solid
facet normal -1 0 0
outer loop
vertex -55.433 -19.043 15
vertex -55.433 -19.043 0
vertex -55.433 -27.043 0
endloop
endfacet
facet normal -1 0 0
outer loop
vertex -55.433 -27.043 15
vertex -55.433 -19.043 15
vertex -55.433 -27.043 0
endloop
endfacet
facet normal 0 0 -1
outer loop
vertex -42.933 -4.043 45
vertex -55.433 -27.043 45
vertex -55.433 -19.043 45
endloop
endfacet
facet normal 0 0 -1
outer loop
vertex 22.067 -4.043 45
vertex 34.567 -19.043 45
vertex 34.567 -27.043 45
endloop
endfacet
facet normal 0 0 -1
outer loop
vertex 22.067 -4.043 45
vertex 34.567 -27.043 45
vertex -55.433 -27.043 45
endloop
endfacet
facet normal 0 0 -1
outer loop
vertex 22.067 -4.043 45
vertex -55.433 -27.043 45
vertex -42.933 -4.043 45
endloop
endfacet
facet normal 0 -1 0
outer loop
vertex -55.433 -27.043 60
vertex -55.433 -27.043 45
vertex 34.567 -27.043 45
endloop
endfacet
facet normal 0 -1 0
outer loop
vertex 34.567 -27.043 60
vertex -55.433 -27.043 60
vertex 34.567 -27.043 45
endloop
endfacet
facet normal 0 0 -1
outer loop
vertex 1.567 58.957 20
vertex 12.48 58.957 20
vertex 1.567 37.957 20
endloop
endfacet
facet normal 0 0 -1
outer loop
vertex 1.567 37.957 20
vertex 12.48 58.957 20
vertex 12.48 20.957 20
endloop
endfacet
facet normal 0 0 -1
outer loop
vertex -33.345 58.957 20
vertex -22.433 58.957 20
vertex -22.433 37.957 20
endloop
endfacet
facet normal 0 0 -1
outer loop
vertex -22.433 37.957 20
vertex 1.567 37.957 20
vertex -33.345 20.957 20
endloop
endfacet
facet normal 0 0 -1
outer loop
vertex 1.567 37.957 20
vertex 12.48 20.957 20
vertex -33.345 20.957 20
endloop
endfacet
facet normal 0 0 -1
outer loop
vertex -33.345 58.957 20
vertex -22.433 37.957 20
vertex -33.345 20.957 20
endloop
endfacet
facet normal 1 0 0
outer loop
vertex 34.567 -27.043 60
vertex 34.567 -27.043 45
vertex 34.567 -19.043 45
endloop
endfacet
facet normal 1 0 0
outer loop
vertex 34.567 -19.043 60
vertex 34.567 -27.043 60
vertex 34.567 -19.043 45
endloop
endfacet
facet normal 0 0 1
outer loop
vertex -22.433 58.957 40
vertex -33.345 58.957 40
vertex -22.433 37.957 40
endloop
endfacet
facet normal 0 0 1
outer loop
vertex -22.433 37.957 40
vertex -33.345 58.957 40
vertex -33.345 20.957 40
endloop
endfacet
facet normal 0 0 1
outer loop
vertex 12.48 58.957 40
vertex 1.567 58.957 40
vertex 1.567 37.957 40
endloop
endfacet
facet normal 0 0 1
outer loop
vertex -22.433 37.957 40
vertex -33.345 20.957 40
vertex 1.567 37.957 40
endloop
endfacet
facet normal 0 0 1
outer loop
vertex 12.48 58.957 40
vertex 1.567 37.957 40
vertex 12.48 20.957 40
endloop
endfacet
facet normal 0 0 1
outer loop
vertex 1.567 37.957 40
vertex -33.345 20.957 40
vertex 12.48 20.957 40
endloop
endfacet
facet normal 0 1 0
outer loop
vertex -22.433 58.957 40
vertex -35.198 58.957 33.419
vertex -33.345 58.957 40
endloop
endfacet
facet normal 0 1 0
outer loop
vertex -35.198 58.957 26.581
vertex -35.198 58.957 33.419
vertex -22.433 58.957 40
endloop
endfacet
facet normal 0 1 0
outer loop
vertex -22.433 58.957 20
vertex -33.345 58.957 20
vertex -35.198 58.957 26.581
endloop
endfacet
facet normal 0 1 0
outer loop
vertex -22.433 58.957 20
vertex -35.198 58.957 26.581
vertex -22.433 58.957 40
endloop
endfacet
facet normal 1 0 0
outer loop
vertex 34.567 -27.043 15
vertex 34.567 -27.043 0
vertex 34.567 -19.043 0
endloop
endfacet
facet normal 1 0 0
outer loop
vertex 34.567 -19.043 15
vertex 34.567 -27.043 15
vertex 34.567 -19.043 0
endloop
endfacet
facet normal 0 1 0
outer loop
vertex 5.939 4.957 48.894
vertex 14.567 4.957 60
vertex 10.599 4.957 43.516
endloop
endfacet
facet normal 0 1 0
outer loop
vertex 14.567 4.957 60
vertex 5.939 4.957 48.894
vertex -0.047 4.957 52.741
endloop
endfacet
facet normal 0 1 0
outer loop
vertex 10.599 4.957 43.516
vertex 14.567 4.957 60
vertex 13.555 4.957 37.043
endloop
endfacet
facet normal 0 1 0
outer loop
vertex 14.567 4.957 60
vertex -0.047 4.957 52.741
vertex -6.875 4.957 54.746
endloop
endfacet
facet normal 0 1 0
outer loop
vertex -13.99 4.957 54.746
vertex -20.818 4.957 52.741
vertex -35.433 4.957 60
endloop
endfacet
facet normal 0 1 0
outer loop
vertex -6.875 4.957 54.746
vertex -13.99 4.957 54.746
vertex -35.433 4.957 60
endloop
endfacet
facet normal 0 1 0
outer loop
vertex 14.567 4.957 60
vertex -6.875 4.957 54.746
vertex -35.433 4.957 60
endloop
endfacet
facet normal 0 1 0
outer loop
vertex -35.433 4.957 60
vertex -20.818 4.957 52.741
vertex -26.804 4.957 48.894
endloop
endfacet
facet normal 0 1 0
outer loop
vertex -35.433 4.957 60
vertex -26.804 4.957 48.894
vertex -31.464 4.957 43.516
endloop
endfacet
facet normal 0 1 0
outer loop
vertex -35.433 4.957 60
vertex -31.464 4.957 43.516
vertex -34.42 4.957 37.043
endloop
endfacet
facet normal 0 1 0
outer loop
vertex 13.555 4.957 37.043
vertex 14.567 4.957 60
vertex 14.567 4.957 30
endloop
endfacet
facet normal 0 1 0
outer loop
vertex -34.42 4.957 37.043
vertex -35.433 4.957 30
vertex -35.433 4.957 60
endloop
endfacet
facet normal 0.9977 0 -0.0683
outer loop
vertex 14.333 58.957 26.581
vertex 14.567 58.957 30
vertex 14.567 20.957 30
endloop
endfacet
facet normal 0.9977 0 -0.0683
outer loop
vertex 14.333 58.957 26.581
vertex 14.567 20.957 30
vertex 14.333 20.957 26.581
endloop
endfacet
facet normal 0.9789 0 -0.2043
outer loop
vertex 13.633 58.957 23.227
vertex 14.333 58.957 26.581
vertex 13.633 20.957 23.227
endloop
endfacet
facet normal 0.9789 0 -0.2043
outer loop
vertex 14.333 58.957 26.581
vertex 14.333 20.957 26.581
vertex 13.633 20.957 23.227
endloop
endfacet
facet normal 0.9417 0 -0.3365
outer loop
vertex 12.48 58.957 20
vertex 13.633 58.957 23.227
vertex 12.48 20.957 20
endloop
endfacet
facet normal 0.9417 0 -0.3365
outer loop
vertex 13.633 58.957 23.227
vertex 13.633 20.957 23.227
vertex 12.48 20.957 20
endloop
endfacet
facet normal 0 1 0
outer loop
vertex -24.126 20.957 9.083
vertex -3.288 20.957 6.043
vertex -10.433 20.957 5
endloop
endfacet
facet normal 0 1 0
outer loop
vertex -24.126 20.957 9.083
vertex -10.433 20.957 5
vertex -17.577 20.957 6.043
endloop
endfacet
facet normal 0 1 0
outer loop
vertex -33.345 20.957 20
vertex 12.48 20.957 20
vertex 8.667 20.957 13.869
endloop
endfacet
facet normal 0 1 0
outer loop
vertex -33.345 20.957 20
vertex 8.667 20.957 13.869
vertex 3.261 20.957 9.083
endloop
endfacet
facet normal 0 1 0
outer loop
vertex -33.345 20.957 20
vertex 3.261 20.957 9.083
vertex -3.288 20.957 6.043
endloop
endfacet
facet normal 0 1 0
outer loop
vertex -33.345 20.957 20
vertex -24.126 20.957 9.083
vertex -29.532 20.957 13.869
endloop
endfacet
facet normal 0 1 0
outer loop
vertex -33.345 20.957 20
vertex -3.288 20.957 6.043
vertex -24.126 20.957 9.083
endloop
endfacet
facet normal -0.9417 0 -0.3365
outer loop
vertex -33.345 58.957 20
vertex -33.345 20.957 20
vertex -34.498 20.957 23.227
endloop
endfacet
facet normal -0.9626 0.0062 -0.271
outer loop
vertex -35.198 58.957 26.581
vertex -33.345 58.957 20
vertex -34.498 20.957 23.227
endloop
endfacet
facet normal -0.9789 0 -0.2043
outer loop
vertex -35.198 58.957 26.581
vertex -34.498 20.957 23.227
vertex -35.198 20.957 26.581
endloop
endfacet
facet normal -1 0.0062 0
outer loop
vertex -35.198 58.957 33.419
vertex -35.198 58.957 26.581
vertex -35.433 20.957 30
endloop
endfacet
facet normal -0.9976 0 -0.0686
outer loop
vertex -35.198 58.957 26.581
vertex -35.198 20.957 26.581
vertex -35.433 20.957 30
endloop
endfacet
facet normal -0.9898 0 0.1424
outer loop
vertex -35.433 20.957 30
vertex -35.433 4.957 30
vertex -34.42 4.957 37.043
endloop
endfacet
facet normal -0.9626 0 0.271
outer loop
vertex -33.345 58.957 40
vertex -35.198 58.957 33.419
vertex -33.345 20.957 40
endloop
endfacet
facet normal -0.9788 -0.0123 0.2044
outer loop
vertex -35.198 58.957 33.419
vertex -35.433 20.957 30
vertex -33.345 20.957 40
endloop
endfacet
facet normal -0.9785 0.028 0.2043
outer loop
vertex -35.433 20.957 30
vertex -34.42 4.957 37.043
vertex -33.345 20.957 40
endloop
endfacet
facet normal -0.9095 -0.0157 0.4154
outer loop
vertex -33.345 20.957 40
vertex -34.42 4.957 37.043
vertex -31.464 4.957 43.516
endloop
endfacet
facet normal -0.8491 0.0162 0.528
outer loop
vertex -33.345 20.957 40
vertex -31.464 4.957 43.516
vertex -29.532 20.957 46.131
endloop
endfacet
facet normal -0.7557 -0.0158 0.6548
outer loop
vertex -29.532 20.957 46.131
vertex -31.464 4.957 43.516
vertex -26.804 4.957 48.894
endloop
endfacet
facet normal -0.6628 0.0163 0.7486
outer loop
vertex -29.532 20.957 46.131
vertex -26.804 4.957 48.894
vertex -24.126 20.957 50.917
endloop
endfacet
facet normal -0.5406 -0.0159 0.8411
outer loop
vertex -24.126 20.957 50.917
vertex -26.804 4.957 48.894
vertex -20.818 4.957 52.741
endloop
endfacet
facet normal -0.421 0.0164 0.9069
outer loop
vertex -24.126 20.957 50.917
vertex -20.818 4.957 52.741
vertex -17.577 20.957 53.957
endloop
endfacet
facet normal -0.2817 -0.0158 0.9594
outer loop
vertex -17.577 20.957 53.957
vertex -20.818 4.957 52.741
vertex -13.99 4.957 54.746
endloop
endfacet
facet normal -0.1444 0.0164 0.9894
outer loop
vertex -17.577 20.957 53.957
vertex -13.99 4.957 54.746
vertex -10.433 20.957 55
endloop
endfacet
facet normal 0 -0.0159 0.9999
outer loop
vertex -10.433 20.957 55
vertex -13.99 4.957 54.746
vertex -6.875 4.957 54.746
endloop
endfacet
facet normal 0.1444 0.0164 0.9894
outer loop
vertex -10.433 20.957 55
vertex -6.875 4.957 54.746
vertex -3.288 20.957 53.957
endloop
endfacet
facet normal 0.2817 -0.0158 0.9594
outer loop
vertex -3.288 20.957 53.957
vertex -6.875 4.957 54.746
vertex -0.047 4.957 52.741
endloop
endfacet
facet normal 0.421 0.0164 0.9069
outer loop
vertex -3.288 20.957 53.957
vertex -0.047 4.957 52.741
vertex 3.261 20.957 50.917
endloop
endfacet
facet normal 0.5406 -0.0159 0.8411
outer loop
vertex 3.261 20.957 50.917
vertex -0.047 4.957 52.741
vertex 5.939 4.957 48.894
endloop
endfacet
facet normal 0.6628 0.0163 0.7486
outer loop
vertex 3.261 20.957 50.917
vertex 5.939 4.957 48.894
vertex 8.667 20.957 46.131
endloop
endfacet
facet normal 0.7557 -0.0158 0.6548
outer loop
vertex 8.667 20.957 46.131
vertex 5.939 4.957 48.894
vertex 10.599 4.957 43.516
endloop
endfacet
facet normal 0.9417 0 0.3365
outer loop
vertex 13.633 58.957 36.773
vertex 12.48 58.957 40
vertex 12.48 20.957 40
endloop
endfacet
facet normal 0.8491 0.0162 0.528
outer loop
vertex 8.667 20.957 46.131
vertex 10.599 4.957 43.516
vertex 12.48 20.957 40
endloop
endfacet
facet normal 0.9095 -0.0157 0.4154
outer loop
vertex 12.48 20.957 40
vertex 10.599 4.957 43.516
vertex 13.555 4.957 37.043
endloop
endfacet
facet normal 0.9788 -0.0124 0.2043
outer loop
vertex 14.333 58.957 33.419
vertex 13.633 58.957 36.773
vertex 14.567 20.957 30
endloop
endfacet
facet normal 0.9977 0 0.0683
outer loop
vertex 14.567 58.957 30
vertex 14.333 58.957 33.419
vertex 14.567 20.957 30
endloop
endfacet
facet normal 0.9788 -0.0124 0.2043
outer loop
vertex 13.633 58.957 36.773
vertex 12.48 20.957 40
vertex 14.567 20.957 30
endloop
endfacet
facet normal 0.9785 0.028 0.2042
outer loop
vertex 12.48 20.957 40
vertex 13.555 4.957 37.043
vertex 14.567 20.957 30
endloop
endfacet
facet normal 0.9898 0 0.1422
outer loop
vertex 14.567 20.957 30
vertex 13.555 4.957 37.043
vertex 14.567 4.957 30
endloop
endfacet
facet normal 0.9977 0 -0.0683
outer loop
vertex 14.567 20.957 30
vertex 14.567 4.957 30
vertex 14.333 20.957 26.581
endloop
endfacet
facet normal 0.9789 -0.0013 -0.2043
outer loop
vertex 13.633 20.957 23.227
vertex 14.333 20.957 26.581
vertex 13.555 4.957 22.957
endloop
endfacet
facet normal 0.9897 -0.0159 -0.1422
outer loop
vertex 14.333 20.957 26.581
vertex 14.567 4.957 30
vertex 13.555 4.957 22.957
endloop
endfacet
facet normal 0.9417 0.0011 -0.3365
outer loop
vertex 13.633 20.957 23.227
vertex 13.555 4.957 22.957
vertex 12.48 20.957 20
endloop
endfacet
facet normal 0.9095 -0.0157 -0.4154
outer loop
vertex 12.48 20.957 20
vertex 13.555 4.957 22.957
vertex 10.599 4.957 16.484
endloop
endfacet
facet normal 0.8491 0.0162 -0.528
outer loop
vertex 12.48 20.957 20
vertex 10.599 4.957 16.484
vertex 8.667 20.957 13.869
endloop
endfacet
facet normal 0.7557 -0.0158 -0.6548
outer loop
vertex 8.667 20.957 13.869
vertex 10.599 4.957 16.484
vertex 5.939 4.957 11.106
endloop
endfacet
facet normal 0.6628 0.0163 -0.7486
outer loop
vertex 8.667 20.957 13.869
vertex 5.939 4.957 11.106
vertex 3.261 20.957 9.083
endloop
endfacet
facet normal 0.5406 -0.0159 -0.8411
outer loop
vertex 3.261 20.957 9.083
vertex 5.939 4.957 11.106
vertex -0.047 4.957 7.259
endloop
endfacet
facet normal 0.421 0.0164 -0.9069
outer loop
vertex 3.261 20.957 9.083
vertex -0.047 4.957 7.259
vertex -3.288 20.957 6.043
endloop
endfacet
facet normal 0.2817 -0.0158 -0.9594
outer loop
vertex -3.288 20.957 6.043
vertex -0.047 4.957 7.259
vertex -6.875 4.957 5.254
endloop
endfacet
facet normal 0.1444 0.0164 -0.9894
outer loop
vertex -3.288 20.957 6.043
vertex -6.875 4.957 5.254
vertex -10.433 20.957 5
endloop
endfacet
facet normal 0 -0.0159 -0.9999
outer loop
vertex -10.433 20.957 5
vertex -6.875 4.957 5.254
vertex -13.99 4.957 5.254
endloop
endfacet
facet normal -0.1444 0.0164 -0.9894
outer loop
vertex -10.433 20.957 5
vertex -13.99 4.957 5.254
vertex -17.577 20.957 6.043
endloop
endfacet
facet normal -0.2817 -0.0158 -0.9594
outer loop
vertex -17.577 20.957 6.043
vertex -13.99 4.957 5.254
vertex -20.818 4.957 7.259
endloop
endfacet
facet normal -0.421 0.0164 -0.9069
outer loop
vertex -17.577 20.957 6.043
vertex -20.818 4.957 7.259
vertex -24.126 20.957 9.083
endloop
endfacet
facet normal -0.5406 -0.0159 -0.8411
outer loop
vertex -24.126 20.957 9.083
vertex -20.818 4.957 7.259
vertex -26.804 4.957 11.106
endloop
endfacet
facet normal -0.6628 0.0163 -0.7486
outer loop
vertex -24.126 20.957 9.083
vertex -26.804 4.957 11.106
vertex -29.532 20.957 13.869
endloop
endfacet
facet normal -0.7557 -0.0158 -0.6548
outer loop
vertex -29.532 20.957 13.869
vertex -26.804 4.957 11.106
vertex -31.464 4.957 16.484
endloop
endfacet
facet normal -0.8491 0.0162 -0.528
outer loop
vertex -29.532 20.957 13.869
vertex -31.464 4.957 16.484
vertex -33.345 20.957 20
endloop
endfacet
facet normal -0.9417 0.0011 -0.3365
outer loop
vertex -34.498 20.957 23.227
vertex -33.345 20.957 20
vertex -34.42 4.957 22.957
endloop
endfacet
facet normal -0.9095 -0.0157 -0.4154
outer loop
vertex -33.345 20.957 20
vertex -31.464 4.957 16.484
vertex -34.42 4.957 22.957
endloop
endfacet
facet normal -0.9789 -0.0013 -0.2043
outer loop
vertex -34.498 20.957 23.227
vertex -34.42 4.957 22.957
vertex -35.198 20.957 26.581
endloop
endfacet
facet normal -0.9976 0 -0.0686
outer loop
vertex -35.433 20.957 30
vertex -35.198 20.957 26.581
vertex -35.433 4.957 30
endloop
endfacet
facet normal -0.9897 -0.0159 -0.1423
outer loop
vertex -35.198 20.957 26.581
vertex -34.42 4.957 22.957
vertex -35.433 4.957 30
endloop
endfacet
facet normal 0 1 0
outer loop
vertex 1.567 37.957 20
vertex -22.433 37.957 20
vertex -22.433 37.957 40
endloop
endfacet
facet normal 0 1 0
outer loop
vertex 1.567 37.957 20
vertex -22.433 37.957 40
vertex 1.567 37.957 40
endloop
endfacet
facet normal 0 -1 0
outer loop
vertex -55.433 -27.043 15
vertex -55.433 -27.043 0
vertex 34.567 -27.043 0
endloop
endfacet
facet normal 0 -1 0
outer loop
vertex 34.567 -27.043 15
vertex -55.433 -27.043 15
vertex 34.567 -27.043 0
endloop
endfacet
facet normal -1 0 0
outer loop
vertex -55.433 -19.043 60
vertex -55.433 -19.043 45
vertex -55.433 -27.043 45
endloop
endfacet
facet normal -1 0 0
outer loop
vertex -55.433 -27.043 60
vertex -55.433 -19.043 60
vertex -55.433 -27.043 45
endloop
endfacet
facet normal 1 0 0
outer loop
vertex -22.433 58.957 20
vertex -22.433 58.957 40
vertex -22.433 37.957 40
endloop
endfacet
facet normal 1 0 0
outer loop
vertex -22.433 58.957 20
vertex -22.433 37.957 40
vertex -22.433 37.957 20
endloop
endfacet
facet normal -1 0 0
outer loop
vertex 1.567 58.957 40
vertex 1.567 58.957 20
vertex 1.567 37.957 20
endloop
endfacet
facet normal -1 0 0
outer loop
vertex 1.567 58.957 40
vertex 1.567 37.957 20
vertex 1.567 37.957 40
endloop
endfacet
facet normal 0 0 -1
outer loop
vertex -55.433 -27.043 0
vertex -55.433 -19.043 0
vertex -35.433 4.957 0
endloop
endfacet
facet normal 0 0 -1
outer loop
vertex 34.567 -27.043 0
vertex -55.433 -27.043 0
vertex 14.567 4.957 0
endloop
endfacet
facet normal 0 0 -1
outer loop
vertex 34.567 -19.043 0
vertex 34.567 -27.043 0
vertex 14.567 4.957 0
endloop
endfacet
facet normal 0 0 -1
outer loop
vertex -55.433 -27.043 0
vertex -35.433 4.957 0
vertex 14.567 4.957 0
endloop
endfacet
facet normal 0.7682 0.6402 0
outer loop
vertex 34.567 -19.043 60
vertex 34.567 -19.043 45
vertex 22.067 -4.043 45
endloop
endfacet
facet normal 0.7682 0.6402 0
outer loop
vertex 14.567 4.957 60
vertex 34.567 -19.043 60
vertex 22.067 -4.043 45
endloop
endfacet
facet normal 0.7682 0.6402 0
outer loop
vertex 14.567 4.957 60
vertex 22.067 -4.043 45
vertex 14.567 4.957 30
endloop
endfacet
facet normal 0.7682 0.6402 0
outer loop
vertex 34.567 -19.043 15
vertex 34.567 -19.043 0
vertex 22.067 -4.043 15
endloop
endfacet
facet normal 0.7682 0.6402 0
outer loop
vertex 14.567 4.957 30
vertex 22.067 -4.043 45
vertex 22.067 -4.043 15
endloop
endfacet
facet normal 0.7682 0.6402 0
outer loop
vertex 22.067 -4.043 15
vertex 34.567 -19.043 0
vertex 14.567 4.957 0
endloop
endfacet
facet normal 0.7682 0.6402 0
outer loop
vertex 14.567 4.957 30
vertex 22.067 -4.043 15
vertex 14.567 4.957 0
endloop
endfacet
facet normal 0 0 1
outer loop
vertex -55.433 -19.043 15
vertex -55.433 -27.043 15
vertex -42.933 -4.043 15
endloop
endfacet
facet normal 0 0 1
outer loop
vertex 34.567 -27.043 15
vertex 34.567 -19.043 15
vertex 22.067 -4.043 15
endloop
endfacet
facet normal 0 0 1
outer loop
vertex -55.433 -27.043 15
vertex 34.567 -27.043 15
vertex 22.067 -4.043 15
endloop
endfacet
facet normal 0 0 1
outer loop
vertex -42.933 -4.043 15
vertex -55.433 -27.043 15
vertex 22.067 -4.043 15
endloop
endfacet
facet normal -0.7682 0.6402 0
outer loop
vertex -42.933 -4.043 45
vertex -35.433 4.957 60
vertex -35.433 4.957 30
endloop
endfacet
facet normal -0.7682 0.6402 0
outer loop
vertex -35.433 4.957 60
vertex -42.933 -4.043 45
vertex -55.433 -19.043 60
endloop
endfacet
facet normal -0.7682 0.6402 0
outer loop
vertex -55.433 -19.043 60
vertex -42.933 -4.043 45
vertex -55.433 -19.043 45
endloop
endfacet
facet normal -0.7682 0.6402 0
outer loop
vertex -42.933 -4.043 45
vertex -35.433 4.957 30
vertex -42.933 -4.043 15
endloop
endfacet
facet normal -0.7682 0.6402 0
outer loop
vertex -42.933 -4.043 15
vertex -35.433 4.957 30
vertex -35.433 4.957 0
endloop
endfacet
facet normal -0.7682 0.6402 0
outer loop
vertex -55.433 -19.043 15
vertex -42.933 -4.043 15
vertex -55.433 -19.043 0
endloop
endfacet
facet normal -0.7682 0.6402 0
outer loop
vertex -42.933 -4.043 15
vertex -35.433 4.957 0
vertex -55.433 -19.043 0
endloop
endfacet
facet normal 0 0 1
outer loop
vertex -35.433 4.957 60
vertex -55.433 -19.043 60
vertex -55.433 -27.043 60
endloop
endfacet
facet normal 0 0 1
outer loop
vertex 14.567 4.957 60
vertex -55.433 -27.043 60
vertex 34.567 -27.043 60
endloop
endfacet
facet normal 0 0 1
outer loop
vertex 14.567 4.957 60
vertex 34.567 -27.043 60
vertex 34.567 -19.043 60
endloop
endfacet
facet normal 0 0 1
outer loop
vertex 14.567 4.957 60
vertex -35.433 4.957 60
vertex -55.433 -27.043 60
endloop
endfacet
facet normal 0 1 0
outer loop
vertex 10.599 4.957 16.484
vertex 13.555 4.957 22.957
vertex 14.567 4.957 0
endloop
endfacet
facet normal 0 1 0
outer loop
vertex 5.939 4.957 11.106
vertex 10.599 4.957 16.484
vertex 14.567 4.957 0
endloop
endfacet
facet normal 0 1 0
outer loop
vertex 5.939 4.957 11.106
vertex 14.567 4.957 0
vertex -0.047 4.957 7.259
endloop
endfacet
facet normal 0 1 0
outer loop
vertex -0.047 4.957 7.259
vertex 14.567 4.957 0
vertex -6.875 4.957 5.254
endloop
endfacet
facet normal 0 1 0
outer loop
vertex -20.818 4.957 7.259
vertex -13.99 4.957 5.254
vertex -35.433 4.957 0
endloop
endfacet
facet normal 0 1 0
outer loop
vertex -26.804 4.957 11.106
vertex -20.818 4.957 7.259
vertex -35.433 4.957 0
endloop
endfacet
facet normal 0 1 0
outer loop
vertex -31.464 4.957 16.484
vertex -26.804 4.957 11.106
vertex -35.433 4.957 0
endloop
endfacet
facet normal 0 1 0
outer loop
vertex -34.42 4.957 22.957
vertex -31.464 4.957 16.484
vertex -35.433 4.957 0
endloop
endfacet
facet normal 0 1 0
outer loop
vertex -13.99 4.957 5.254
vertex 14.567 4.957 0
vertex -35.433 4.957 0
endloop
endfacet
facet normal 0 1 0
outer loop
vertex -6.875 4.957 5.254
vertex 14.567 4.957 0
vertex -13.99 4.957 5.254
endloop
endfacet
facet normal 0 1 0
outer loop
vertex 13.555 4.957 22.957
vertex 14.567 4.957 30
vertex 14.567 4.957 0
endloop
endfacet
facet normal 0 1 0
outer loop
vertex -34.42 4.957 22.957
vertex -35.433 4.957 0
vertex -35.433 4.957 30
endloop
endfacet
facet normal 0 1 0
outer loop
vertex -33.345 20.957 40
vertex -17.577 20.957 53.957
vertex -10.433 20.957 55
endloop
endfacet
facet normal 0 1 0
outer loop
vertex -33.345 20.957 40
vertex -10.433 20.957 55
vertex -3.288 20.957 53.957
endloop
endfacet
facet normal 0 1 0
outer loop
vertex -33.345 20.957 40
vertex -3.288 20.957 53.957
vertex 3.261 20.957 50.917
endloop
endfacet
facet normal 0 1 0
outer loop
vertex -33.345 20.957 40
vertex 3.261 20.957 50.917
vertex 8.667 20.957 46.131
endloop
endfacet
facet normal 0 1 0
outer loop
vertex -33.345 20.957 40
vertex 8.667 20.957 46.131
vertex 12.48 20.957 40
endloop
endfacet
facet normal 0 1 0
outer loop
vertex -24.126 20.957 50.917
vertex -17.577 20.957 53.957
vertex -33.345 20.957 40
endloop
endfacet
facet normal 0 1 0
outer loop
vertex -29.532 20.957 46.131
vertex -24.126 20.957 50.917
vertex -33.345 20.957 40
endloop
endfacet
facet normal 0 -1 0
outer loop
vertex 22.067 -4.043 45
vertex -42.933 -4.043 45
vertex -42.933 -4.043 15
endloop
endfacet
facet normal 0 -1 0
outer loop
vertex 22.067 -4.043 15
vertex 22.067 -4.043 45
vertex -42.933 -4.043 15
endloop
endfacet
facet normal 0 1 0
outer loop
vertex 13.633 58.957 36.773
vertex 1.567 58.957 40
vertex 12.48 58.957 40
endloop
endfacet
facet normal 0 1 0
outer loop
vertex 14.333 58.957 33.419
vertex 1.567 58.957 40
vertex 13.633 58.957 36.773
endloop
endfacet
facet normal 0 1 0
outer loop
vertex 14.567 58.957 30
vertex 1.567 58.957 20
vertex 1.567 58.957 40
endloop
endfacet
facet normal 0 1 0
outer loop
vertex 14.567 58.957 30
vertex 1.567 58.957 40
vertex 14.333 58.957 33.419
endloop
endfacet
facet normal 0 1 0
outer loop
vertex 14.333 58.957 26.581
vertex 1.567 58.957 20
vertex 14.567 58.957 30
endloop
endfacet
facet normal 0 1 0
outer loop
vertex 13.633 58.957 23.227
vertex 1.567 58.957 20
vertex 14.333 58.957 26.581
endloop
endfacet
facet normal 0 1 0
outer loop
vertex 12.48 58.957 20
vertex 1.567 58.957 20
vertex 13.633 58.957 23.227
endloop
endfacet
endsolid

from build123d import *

# Parameters (mm, degrees)
BOSS_EXTRUDE1_DEPTH = 60
SKETCH2_R           = 25
BOSS_EXTRUDE2_DEPTH = 16
BOSS_EXTRUDE4_DEPTH = 17
BOSS_EXTRUDE5_DEPTH = 38
SKETCH4_W           = 30
SKETCH4_H           = 23
CUT_EXTRUDE1_DEPTH  = 110


with BuildPart() as part:
    # Sketch1 → Boss-Extrude1 (new body)
    with BuildSketch(Plane.XY):
        Polygon((-55.432527154, -19.042703446), (-55.432527154, -27.042703446), (34.567472846, -27.042703446), (34.567472846, -19.042703446), (14.567472846, 4.957296554), (-35.432527154, 4.957296554), align=None)
    extrude(amount=BOSS_EXTRUDE1_DEPTH)

    # Sketch2 → Boss-Extrude2 (add)
    with BuildSketch(Plane(origin=(0, 4.957296554, 0), x_dir=(1, 0, 0), z_dir=(0, 1, 0))):
        with Locations((-10.432527154, -30)):
            Circle(SKETCH2_R)
    extrude(amount=BOSS_EXTRUDE2_DEPTH)

    # Sketch3 → Boss-Extrude4 (add)
    with BuildSketch(Plane(origin=(0, 20.957296554, 0), x_dir=(1, 0, 0), z_dir=(0, 1, 0))):
        Polygon((1.567472846, -20), (-10.432527154, -20), (-22.432527154, -20), (-22.432527154, -40), (-10.432527154, -40), (1.567472846, -40), align=None)
    extrude(amount=BOSS_EXTRUDE4_DEPTH)

    # Sketch3<4> → Boss-Extrude5 (add)
    with BuildSketch(Plane(origin=(0, 20.957296554, 0), x_dir=(1, 0, 0), z_dir=(0, 1, 0))):
        with BuildLine():
            Line((-22.432527154, -40), (-22.432527154, -20))
            Line((-22.432527154, -20), (-33.345405628, -20))
            ThreePointArc((-33.345405628, -20), (-35.432527154, -30), (-33.345405628, -40))
            Line((-33.345405628, -40), (-22.432527154, -40))
        make_face()
        with BuildLine():
            Line((12.480351321, -20), (1.567472846, -20))
            Line((1.567472846, -20), (1.567472846, -40))
            Line((1.567472846, -40), (12.480351321, -40))
            ThreePointArc((12.480351321, -40), (14.567472846, -30), (12.480351321, -20))
        make_face()
    extrude(amount=BOSS_EXTRUDE5_DEPTH)

    # Sketch4 → Cut-Extrude1 (cut)
    with BuildSketch(Plane(origin=(34.567472846, 0, 0), x_dir=(0, 0, -1), z_dir=(1, 0, 0))):
        with Locations((-30, -15.542703446)):
            Rectangle(SKETCH4_W, SKETCH4_H)
    extrude(amount=-CUT_EXTRUDE1_DEPTH, mode=Mode.SUBTRACT)


solid = part.part
